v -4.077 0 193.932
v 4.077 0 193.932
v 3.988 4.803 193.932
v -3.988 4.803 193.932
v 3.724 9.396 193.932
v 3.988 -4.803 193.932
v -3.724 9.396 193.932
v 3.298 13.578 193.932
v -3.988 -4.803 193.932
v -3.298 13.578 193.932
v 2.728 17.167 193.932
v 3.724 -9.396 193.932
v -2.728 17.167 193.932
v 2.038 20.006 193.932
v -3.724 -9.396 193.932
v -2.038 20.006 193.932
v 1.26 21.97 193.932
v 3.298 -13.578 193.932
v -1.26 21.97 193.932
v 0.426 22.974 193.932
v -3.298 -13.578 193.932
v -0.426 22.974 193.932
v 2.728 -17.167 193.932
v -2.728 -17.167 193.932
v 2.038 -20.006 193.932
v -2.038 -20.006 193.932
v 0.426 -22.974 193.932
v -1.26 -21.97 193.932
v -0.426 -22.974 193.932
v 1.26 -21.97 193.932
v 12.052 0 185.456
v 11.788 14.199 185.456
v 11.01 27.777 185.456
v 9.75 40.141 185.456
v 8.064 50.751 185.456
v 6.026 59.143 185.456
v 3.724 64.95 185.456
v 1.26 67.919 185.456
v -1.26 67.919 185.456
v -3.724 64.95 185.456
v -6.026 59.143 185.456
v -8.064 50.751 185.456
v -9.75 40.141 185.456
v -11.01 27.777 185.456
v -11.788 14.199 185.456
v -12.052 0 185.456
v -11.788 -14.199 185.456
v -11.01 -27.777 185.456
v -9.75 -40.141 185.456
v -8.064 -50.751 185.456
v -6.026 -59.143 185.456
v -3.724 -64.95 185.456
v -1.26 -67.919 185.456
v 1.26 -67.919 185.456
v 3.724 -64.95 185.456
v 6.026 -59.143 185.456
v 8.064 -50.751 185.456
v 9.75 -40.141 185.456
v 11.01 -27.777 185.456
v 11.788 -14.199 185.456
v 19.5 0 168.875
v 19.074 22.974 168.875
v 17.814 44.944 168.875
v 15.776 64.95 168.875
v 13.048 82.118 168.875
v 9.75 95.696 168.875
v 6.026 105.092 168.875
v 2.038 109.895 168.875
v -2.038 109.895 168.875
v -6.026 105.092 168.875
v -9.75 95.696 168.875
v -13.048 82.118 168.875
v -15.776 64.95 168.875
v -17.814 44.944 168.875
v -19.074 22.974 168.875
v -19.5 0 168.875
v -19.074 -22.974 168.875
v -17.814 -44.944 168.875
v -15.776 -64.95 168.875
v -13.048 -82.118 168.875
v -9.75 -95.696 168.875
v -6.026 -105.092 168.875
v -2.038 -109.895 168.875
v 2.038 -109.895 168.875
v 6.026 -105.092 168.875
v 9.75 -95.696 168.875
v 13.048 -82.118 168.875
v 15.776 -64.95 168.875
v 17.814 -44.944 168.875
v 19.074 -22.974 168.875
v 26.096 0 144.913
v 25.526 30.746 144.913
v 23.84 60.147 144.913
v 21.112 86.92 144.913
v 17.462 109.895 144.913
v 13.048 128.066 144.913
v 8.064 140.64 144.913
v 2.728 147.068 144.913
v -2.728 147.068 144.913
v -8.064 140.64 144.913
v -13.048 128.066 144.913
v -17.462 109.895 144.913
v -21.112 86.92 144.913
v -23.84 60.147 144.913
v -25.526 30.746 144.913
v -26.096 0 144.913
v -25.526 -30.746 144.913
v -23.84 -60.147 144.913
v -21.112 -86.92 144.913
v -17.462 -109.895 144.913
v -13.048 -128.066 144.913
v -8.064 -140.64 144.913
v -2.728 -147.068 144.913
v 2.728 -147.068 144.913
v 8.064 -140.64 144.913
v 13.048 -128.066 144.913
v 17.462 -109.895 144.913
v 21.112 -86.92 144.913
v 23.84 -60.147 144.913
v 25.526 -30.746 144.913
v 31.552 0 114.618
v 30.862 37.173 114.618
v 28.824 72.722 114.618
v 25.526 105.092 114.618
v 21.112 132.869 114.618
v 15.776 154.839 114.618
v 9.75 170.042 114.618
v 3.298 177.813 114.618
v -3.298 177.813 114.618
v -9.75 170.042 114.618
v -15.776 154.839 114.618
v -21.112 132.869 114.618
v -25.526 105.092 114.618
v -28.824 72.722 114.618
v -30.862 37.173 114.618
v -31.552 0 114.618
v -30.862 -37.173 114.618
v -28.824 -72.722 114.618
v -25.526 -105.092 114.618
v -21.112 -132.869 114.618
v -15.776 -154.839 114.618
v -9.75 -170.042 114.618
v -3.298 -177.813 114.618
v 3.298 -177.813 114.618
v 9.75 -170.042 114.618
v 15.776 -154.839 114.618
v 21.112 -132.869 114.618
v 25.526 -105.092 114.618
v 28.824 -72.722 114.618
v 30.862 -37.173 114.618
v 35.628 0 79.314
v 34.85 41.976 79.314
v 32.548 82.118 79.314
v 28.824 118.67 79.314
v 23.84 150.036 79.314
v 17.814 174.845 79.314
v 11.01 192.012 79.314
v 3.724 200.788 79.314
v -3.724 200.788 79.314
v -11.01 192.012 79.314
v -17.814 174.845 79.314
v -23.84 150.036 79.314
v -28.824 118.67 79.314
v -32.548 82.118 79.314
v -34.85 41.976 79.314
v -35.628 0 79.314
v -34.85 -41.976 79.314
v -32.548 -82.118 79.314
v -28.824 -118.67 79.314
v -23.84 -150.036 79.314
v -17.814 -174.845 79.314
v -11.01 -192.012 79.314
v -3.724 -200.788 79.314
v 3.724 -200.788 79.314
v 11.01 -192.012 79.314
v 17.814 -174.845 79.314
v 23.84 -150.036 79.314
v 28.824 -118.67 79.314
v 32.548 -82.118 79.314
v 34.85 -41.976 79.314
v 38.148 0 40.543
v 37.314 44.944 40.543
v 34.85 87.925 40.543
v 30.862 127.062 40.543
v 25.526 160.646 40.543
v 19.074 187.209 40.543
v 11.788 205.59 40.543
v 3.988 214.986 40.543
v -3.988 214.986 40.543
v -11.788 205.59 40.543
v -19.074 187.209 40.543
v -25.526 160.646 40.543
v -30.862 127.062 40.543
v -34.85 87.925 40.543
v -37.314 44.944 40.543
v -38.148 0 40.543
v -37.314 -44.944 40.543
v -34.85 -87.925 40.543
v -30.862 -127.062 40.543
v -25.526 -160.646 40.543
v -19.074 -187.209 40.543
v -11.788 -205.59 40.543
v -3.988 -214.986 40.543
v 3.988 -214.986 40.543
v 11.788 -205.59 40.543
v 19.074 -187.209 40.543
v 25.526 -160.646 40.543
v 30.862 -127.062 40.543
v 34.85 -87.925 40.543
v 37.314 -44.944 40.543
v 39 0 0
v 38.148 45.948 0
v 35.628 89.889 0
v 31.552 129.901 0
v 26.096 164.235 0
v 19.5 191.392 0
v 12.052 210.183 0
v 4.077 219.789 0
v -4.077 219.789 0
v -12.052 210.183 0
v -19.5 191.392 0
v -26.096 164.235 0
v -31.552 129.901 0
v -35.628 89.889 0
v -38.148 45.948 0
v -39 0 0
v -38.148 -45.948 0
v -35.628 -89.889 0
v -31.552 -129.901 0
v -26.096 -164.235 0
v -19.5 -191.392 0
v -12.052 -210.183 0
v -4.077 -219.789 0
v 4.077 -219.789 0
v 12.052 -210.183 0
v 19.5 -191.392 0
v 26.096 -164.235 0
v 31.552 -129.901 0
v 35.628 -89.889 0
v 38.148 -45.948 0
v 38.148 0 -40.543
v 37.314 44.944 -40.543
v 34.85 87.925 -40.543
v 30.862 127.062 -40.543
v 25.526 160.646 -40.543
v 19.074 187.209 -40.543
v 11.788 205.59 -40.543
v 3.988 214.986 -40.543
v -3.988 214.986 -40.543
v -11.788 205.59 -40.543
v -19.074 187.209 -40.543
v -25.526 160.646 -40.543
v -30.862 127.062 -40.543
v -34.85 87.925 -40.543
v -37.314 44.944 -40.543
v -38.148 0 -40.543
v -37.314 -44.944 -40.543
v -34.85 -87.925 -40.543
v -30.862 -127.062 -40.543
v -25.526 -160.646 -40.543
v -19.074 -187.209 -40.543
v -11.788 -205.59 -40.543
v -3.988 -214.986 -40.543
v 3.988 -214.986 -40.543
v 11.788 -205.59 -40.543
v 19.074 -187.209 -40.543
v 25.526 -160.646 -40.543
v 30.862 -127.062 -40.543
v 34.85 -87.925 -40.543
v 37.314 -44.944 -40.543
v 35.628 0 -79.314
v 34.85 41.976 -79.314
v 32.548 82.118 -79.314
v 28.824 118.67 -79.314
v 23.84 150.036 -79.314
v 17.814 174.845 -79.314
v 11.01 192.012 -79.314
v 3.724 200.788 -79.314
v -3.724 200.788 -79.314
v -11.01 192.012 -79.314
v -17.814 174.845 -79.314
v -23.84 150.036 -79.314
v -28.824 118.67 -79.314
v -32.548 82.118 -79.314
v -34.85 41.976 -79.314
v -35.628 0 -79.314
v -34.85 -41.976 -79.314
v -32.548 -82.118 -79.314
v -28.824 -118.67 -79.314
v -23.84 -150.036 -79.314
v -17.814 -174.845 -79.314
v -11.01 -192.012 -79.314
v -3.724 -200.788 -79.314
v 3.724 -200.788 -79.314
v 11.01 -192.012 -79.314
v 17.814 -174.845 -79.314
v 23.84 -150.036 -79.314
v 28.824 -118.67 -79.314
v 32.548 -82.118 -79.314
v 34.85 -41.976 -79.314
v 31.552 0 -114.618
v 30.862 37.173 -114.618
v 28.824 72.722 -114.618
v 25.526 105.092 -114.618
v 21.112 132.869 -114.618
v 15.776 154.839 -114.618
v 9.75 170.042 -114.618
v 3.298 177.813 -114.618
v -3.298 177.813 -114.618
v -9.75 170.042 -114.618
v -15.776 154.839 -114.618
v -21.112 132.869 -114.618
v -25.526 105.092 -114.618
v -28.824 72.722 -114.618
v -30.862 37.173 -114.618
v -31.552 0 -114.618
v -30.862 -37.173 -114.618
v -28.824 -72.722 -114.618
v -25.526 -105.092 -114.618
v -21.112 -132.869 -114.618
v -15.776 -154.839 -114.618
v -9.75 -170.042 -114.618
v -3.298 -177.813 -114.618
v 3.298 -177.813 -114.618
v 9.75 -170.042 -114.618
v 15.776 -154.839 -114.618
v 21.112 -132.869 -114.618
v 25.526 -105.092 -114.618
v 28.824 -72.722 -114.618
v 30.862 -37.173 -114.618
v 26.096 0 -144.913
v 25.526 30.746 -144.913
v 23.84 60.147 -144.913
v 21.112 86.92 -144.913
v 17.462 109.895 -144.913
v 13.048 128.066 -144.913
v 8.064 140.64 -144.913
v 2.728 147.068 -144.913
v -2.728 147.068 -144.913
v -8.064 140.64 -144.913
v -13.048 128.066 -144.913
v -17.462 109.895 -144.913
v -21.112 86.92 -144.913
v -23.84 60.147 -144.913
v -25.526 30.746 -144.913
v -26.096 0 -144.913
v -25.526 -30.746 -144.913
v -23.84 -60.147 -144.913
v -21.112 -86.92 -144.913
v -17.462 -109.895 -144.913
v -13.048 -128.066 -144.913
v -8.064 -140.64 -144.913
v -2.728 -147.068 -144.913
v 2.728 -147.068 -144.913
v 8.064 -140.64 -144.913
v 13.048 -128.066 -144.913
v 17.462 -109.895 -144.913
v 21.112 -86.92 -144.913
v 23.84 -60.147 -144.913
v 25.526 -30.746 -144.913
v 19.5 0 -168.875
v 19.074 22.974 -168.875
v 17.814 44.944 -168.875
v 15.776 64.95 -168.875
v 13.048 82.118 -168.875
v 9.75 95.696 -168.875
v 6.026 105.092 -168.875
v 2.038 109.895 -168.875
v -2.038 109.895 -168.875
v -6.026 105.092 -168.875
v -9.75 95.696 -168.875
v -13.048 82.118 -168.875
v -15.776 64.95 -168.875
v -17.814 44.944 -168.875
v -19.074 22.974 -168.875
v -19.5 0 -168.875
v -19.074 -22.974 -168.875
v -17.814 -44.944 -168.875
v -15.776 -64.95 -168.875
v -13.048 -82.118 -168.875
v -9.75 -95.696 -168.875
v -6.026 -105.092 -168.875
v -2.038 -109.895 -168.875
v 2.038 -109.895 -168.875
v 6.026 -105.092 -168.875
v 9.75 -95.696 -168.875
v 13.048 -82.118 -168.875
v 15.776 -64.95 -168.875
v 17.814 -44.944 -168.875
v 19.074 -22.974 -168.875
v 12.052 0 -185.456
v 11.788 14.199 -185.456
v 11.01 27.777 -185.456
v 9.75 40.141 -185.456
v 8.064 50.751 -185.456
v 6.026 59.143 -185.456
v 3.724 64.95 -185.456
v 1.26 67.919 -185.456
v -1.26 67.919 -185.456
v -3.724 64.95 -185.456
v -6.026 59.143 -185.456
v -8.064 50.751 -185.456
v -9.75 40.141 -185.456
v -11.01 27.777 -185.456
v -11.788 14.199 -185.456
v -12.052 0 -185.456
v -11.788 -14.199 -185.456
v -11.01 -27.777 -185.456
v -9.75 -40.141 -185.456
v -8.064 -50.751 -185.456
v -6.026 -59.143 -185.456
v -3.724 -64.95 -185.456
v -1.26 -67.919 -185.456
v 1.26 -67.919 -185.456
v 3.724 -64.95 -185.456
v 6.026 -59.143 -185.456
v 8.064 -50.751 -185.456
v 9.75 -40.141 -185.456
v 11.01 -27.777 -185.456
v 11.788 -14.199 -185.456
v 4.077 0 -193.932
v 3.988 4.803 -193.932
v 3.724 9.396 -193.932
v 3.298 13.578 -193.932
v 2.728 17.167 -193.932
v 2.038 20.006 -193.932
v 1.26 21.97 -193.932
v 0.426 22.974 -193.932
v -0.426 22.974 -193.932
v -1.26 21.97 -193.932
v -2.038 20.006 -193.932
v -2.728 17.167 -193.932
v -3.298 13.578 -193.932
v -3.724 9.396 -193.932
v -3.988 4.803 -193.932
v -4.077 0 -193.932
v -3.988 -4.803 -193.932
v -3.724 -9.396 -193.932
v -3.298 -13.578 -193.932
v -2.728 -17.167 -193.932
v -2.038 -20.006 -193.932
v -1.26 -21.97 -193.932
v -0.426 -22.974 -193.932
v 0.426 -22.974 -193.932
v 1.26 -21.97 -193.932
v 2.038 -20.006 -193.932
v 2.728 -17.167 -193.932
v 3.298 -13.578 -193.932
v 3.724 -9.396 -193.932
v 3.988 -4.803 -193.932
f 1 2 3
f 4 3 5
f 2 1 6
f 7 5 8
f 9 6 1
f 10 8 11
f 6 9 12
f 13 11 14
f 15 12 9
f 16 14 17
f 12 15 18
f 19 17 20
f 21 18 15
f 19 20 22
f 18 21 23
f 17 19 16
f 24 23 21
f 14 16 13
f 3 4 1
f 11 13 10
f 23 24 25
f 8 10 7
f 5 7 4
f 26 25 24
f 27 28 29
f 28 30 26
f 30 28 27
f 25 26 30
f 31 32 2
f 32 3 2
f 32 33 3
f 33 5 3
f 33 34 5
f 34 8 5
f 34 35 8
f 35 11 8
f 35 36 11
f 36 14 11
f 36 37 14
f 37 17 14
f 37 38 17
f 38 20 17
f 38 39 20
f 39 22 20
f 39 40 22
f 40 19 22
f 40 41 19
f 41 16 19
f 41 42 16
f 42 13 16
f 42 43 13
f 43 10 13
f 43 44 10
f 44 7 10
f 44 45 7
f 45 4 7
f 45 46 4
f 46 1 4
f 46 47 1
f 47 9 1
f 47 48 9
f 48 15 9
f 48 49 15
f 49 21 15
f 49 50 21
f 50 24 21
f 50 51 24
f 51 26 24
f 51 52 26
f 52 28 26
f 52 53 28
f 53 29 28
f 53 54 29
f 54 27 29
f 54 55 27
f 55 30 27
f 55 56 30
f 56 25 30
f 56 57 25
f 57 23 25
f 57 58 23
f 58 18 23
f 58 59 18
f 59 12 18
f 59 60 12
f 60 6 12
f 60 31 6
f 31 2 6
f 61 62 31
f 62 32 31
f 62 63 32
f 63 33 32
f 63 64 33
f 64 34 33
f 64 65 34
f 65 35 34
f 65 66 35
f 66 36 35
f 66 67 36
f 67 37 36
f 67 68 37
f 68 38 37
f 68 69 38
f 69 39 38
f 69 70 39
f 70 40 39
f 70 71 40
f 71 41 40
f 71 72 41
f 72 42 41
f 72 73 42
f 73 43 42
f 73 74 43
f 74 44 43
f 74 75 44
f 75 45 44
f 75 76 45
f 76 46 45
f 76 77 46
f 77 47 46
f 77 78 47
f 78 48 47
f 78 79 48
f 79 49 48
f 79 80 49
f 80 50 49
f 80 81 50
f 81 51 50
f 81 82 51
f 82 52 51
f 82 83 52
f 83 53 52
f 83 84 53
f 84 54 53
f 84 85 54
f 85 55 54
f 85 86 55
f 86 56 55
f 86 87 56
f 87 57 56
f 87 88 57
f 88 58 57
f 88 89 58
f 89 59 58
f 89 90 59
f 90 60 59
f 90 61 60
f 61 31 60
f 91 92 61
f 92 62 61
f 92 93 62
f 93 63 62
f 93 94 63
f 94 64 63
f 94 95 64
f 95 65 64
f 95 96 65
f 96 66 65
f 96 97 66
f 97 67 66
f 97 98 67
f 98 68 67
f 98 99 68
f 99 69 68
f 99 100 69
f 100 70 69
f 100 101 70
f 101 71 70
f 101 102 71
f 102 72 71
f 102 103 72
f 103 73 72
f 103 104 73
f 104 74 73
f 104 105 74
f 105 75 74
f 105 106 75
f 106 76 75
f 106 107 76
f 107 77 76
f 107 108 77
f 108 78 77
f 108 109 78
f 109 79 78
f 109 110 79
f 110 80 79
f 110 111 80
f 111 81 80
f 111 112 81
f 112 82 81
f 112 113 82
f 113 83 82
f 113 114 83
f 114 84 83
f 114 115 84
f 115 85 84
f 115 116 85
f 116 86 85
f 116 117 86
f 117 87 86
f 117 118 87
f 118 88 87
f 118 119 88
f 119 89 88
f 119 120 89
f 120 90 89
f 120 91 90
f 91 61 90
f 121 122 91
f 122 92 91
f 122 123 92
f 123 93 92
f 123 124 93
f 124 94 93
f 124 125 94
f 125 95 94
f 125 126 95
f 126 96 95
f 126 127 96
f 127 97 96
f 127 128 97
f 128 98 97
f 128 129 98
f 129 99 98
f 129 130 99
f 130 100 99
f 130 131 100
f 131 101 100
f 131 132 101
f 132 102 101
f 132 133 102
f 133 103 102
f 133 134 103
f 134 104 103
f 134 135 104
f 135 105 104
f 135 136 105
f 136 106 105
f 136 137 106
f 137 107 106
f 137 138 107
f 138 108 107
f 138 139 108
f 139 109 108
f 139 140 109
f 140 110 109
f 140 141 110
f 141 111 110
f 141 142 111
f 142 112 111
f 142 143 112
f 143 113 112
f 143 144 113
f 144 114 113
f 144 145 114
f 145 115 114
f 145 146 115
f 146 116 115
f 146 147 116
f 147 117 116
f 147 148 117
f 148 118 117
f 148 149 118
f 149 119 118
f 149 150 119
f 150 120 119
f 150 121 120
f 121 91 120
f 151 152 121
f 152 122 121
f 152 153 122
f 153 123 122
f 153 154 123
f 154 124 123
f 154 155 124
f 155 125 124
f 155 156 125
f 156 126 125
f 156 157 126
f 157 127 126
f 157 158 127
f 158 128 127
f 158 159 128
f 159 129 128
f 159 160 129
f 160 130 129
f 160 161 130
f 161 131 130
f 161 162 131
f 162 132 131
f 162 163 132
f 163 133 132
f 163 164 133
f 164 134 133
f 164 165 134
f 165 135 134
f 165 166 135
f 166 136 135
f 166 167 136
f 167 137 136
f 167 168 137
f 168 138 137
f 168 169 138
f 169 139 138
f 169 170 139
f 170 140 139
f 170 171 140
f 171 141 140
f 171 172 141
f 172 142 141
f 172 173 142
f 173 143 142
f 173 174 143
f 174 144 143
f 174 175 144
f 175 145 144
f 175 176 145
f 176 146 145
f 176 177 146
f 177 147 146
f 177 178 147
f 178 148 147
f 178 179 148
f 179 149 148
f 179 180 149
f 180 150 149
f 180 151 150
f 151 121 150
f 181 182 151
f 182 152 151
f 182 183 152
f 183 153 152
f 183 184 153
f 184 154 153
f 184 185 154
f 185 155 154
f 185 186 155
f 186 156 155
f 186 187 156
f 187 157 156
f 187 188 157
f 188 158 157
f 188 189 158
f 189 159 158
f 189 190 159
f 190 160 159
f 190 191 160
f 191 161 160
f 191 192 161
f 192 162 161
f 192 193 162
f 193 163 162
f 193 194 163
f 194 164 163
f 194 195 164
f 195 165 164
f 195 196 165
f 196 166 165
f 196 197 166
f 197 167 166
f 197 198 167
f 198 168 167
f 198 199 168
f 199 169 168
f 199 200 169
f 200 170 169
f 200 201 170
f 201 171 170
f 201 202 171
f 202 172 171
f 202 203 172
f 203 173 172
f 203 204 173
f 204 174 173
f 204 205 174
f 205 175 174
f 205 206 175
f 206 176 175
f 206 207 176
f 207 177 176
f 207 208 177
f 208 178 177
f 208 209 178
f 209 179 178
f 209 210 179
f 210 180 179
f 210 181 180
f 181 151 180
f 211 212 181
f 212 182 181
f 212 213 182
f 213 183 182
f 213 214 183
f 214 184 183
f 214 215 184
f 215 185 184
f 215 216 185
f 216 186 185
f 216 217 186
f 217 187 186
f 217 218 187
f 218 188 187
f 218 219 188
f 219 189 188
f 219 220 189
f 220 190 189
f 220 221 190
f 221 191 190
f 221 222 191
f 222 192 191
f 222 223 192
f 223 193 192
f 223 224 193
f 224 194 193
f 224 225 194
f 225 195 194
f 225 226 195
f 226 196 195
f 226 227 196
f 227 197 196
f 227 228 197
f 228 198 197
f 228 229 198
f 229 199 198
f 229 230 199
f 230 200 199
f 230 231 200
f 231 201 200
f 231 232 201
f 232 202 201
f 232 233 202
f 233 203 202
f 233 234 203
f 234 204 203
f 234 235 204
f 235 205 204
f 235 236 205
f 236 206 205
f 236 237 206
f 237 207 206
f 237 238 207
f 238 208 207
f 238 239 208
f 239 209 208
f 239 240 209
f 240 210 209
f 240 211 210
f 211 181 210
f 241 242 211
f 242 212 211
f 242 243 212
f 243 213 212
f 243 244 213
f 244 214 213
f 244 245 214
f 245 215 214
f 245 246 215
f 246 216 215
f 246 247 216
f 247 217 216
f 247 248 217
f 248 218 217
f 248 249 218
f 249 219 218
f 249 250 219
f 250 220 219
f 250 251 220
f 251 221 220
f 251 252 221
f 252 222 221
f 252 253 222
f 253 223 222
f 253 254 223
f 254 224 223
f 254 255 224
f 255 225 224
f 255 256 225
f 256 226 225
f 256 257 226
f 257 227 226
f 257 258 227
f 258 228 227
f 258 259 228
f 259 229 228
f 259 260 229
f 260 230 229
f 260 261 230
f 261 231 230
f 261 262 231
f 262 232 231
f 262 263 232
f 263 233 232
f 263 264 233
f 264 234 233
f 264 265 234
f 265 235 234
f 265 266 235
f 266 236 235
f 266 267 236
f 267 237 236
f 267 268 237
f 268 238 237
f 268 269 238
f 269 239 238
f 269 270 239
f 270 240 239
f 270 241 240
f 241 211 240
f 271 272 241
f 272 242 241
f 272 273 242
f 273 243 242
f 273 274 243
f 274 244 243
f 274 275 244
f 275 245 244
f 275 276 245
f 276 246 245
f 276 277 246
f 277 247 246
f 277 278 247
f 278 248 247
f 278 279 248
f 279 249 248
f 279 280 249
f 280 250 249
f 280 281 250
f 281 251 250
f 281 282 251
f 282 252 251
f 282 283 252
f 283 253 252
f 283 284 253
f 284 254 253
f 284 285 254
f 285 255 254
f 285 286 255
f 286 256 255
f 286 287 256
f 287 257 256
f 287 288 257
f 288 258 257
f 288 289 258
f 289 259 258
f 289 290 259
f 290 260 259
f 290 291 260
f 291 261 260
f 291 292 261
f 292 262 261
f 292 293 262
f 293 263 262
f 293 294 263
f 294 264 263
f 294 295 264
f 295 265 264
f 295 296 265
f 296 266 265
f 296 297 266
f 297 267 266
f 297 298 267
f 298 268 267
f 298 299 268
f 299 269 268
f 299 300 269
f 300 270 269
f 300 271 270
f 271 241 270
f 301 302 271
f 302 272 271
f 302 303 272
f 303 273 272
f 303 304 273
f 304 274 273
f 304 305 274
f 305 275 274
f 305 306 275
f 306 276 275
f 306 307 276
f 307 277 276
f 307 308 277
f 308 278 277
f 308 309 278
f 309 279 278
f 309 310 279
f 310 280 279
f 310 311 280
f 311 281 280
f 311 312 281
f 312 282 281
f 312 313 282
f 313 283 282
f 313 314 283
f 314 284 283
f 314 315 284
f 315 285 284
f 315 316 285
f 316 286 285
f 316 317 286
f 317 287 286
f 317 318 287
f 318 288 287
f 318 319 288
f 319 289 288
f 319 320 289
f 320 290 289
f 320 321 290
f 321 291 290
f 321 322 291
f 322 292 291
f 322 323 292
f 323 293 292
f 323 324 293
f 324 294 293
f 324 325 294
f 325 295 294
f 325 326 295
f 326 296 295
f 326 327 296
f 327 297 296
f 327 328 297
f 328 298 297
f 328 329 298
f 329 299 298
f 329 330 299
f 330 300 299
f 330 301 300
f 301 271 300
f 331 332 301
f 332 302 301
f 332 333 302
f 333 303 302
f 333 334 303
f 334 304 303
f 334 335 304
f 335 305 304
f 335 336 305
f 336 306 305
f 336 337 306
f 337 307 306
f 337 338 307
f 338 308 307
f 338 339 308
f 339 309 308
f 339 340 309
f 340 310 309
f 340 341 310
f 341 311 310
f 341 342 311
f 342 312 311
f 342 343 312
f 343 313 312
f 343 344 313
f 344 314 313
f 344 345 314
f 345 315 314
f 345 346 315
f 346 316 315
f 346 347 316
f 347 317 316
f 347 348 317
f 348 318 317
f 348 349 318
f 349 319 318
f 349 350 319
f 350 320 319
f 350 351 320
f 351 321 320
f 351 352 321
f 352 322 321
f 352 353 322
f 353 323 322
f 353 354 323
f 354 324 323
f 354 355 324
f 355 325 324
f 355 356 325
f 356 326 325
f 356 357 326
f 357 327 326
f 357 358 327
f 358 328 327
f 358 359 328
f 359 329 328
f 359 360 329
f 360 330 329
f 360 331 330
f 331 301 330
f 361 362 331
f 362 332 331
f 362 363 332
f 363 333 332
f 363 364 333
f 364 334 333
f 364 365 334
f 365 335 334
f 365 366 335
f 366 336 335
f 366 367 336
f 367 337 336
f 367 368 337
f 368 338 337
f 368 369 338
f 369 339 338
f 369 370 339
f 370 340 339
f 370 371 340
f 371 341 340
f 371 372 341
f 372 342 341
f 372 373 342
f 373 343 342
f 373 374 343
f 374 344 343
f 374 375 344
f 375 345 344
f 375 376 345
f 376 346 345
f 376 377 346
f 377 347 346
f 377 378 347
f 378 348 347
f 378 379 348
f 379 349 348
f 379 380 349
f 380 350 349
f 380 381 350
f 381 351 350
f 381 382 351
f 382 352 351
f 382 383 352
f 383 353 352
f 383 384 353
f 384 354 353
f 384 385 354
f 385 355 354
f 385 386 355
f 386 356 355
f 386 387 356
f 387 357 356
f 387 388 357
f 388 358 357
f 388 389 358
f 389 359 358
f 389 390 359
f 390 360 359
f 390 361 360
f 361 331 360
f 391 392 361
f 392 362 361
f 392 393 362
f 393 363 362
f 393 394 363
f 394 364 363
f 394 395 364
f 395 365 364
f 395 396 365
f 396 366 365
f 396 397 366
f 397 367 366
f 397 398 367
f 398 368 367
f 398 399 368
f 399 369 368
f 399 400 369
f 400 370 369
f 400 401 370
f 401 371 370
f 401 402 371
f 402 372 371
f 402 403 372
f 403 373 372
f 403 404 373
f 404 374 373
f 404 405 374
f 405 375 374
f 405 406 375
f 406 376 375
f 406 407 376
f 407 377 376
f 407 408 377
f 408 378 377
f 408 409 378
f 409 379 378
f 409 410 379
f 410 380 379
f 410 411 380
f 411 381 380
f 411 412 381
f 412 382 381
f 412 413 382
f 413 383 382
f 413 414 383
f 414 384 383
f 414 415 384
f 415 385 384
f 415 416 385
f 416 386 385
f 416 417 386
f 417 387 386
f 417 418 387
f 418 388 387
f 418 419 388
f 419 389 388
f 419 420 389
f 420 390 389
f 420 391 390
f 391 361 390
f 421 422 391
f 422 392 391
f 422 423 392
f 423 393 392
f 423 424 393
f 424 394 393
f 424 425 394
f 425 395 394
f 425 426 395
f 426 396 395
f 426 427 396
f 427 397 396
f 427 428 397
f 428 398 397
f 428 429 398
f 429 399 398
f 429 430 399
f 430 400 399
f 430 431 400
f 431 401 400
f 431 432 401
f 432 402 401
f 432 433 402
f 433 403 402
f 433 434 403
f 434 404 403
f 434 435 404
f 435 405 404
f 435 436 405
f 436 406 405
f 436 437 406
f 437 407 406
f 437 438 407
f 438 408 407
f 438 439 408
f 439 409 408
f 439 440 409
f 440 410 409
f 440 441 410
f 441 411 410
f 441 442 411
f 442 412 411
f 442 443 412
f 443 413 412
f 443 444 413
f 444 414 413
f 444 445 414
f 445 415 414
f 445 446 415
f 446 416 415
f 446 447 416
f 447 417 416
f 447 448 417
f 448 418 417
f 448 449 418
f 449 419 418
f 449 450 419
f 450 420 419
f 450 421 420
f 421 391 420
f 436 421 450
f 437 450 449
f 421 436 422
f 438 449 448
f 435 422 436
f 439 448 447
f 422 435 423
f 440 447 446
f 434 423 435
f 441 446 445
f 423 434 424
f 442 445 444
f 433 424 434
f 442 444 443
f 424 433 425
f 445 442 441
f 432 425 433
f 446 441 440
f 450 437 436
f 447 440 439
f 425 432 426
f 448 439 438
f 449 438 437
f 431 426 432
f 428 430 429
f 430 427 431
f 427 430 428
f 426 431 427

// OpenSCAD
// Generated by SolidPython 1.0.1 on 2020-07-29 00:46:46


scale(v = [3, 17, 15]) {
	sphere(r = 13);
}
/***********************************************
*********      SolidPython code:      **********
************************************************
 
# import packages: SolidPython
from solid import *
from solid.utils import *
from itertools import chain, combinations, permutations


class Resize:

    def __init__(self, scad_file):
        self.scad_file = scad_file
        #self.scad_file = import_scad(scad_file)
        # cone/cylinder param:
        self.r1 = 0
        self.r2 = 0
        self.h = 0
        # rectangular prism param:
        self.w = 0
        self.l = 0
        # ellipse param:
        self.r = 0

    # import OpenScad code (file name corresponds to shape)


    # classify shape + parameters
    def assign(self, param1, param2, param3):
        if self.scad_file == 'cone.scad':
            self.r1 = param1
            self.r2 = param2
            self.h = param3
        elif self.scad_file == 'cylinder.scad':
            self.r1 = param1
            self.r2 = param2
            self.h = param3
        elif self.scad_file == 'rectangularPrism.scad':
            self.h = param1
            self.l = param2
            self.w = param3
        else:
            self.r = param1
            self.h = param2

    # resize parameters
    def iterate(self):
        x = range(3, 20, 2)
        i = 1
        if self.scad_file == 'cone.scad':
            tempList = list(permutations(x, 2))
            for temp in tempList:
                param1 = temp[0]
                param2 = temp[1]
                filepath = 'produced_scad_files/' + 'cone' + str(param1) + '_' + str(param2) + '_' + '.scad'
                scad_render_to_file(cylinder(h=param1, r1=param2, r2=0), filepath)

        elif self.scad_file == 'cylinder.scad':
            tempList = list(permutations(x, 3))
            for temp in tempList:
                param1 = temp[0]
                param2 = temp[1]
                filepath = 'produced_scad_files/' + 'cylinder' + str(param1) + '_' + str(param2) + '_' + '.scad'
                scad_render_to_file(cylinder(h=param1, r1=param2, r2=param2), filepath)

        elif self.scad_file == 'rectangularPrism.scad':
            tempList = list(permutations(x, 3))
            for temp in tempList:
                param1 = temp[0]
                param2 = temp[1]
                param3 = temp[2]
                filepath = 'produced_scad_files/' + 'rectangularPrism' + str(param1) + '_' + str(param2) + '_' + str(
                    param3) + '.scad'
                scad_render_to_file(cube(size=(param1, param2, param3)), filepath)

        elif self.scad_file == 'ellipse.scad':
            tempList = list(permutations(x, 4))
            for temp in tempList:
                param1 = temp[0]
                param2 = temp[1]
                param3 = temp[2]
                param4 = temp[3]
                filepath = 'produced_scad_files/' + 'ellipse' + str(param1) + '_' + str(param2) + '_' + str(param3) + '_' + str(param4) + '.scad'
                scad_render_to_file(scale([param1, param2, param3])(sphere(r=param4)), filepath)

    def render_to_scadfile(self):
        scad_render_to_file(scad, 'example.scad') 
 
************************************************/
